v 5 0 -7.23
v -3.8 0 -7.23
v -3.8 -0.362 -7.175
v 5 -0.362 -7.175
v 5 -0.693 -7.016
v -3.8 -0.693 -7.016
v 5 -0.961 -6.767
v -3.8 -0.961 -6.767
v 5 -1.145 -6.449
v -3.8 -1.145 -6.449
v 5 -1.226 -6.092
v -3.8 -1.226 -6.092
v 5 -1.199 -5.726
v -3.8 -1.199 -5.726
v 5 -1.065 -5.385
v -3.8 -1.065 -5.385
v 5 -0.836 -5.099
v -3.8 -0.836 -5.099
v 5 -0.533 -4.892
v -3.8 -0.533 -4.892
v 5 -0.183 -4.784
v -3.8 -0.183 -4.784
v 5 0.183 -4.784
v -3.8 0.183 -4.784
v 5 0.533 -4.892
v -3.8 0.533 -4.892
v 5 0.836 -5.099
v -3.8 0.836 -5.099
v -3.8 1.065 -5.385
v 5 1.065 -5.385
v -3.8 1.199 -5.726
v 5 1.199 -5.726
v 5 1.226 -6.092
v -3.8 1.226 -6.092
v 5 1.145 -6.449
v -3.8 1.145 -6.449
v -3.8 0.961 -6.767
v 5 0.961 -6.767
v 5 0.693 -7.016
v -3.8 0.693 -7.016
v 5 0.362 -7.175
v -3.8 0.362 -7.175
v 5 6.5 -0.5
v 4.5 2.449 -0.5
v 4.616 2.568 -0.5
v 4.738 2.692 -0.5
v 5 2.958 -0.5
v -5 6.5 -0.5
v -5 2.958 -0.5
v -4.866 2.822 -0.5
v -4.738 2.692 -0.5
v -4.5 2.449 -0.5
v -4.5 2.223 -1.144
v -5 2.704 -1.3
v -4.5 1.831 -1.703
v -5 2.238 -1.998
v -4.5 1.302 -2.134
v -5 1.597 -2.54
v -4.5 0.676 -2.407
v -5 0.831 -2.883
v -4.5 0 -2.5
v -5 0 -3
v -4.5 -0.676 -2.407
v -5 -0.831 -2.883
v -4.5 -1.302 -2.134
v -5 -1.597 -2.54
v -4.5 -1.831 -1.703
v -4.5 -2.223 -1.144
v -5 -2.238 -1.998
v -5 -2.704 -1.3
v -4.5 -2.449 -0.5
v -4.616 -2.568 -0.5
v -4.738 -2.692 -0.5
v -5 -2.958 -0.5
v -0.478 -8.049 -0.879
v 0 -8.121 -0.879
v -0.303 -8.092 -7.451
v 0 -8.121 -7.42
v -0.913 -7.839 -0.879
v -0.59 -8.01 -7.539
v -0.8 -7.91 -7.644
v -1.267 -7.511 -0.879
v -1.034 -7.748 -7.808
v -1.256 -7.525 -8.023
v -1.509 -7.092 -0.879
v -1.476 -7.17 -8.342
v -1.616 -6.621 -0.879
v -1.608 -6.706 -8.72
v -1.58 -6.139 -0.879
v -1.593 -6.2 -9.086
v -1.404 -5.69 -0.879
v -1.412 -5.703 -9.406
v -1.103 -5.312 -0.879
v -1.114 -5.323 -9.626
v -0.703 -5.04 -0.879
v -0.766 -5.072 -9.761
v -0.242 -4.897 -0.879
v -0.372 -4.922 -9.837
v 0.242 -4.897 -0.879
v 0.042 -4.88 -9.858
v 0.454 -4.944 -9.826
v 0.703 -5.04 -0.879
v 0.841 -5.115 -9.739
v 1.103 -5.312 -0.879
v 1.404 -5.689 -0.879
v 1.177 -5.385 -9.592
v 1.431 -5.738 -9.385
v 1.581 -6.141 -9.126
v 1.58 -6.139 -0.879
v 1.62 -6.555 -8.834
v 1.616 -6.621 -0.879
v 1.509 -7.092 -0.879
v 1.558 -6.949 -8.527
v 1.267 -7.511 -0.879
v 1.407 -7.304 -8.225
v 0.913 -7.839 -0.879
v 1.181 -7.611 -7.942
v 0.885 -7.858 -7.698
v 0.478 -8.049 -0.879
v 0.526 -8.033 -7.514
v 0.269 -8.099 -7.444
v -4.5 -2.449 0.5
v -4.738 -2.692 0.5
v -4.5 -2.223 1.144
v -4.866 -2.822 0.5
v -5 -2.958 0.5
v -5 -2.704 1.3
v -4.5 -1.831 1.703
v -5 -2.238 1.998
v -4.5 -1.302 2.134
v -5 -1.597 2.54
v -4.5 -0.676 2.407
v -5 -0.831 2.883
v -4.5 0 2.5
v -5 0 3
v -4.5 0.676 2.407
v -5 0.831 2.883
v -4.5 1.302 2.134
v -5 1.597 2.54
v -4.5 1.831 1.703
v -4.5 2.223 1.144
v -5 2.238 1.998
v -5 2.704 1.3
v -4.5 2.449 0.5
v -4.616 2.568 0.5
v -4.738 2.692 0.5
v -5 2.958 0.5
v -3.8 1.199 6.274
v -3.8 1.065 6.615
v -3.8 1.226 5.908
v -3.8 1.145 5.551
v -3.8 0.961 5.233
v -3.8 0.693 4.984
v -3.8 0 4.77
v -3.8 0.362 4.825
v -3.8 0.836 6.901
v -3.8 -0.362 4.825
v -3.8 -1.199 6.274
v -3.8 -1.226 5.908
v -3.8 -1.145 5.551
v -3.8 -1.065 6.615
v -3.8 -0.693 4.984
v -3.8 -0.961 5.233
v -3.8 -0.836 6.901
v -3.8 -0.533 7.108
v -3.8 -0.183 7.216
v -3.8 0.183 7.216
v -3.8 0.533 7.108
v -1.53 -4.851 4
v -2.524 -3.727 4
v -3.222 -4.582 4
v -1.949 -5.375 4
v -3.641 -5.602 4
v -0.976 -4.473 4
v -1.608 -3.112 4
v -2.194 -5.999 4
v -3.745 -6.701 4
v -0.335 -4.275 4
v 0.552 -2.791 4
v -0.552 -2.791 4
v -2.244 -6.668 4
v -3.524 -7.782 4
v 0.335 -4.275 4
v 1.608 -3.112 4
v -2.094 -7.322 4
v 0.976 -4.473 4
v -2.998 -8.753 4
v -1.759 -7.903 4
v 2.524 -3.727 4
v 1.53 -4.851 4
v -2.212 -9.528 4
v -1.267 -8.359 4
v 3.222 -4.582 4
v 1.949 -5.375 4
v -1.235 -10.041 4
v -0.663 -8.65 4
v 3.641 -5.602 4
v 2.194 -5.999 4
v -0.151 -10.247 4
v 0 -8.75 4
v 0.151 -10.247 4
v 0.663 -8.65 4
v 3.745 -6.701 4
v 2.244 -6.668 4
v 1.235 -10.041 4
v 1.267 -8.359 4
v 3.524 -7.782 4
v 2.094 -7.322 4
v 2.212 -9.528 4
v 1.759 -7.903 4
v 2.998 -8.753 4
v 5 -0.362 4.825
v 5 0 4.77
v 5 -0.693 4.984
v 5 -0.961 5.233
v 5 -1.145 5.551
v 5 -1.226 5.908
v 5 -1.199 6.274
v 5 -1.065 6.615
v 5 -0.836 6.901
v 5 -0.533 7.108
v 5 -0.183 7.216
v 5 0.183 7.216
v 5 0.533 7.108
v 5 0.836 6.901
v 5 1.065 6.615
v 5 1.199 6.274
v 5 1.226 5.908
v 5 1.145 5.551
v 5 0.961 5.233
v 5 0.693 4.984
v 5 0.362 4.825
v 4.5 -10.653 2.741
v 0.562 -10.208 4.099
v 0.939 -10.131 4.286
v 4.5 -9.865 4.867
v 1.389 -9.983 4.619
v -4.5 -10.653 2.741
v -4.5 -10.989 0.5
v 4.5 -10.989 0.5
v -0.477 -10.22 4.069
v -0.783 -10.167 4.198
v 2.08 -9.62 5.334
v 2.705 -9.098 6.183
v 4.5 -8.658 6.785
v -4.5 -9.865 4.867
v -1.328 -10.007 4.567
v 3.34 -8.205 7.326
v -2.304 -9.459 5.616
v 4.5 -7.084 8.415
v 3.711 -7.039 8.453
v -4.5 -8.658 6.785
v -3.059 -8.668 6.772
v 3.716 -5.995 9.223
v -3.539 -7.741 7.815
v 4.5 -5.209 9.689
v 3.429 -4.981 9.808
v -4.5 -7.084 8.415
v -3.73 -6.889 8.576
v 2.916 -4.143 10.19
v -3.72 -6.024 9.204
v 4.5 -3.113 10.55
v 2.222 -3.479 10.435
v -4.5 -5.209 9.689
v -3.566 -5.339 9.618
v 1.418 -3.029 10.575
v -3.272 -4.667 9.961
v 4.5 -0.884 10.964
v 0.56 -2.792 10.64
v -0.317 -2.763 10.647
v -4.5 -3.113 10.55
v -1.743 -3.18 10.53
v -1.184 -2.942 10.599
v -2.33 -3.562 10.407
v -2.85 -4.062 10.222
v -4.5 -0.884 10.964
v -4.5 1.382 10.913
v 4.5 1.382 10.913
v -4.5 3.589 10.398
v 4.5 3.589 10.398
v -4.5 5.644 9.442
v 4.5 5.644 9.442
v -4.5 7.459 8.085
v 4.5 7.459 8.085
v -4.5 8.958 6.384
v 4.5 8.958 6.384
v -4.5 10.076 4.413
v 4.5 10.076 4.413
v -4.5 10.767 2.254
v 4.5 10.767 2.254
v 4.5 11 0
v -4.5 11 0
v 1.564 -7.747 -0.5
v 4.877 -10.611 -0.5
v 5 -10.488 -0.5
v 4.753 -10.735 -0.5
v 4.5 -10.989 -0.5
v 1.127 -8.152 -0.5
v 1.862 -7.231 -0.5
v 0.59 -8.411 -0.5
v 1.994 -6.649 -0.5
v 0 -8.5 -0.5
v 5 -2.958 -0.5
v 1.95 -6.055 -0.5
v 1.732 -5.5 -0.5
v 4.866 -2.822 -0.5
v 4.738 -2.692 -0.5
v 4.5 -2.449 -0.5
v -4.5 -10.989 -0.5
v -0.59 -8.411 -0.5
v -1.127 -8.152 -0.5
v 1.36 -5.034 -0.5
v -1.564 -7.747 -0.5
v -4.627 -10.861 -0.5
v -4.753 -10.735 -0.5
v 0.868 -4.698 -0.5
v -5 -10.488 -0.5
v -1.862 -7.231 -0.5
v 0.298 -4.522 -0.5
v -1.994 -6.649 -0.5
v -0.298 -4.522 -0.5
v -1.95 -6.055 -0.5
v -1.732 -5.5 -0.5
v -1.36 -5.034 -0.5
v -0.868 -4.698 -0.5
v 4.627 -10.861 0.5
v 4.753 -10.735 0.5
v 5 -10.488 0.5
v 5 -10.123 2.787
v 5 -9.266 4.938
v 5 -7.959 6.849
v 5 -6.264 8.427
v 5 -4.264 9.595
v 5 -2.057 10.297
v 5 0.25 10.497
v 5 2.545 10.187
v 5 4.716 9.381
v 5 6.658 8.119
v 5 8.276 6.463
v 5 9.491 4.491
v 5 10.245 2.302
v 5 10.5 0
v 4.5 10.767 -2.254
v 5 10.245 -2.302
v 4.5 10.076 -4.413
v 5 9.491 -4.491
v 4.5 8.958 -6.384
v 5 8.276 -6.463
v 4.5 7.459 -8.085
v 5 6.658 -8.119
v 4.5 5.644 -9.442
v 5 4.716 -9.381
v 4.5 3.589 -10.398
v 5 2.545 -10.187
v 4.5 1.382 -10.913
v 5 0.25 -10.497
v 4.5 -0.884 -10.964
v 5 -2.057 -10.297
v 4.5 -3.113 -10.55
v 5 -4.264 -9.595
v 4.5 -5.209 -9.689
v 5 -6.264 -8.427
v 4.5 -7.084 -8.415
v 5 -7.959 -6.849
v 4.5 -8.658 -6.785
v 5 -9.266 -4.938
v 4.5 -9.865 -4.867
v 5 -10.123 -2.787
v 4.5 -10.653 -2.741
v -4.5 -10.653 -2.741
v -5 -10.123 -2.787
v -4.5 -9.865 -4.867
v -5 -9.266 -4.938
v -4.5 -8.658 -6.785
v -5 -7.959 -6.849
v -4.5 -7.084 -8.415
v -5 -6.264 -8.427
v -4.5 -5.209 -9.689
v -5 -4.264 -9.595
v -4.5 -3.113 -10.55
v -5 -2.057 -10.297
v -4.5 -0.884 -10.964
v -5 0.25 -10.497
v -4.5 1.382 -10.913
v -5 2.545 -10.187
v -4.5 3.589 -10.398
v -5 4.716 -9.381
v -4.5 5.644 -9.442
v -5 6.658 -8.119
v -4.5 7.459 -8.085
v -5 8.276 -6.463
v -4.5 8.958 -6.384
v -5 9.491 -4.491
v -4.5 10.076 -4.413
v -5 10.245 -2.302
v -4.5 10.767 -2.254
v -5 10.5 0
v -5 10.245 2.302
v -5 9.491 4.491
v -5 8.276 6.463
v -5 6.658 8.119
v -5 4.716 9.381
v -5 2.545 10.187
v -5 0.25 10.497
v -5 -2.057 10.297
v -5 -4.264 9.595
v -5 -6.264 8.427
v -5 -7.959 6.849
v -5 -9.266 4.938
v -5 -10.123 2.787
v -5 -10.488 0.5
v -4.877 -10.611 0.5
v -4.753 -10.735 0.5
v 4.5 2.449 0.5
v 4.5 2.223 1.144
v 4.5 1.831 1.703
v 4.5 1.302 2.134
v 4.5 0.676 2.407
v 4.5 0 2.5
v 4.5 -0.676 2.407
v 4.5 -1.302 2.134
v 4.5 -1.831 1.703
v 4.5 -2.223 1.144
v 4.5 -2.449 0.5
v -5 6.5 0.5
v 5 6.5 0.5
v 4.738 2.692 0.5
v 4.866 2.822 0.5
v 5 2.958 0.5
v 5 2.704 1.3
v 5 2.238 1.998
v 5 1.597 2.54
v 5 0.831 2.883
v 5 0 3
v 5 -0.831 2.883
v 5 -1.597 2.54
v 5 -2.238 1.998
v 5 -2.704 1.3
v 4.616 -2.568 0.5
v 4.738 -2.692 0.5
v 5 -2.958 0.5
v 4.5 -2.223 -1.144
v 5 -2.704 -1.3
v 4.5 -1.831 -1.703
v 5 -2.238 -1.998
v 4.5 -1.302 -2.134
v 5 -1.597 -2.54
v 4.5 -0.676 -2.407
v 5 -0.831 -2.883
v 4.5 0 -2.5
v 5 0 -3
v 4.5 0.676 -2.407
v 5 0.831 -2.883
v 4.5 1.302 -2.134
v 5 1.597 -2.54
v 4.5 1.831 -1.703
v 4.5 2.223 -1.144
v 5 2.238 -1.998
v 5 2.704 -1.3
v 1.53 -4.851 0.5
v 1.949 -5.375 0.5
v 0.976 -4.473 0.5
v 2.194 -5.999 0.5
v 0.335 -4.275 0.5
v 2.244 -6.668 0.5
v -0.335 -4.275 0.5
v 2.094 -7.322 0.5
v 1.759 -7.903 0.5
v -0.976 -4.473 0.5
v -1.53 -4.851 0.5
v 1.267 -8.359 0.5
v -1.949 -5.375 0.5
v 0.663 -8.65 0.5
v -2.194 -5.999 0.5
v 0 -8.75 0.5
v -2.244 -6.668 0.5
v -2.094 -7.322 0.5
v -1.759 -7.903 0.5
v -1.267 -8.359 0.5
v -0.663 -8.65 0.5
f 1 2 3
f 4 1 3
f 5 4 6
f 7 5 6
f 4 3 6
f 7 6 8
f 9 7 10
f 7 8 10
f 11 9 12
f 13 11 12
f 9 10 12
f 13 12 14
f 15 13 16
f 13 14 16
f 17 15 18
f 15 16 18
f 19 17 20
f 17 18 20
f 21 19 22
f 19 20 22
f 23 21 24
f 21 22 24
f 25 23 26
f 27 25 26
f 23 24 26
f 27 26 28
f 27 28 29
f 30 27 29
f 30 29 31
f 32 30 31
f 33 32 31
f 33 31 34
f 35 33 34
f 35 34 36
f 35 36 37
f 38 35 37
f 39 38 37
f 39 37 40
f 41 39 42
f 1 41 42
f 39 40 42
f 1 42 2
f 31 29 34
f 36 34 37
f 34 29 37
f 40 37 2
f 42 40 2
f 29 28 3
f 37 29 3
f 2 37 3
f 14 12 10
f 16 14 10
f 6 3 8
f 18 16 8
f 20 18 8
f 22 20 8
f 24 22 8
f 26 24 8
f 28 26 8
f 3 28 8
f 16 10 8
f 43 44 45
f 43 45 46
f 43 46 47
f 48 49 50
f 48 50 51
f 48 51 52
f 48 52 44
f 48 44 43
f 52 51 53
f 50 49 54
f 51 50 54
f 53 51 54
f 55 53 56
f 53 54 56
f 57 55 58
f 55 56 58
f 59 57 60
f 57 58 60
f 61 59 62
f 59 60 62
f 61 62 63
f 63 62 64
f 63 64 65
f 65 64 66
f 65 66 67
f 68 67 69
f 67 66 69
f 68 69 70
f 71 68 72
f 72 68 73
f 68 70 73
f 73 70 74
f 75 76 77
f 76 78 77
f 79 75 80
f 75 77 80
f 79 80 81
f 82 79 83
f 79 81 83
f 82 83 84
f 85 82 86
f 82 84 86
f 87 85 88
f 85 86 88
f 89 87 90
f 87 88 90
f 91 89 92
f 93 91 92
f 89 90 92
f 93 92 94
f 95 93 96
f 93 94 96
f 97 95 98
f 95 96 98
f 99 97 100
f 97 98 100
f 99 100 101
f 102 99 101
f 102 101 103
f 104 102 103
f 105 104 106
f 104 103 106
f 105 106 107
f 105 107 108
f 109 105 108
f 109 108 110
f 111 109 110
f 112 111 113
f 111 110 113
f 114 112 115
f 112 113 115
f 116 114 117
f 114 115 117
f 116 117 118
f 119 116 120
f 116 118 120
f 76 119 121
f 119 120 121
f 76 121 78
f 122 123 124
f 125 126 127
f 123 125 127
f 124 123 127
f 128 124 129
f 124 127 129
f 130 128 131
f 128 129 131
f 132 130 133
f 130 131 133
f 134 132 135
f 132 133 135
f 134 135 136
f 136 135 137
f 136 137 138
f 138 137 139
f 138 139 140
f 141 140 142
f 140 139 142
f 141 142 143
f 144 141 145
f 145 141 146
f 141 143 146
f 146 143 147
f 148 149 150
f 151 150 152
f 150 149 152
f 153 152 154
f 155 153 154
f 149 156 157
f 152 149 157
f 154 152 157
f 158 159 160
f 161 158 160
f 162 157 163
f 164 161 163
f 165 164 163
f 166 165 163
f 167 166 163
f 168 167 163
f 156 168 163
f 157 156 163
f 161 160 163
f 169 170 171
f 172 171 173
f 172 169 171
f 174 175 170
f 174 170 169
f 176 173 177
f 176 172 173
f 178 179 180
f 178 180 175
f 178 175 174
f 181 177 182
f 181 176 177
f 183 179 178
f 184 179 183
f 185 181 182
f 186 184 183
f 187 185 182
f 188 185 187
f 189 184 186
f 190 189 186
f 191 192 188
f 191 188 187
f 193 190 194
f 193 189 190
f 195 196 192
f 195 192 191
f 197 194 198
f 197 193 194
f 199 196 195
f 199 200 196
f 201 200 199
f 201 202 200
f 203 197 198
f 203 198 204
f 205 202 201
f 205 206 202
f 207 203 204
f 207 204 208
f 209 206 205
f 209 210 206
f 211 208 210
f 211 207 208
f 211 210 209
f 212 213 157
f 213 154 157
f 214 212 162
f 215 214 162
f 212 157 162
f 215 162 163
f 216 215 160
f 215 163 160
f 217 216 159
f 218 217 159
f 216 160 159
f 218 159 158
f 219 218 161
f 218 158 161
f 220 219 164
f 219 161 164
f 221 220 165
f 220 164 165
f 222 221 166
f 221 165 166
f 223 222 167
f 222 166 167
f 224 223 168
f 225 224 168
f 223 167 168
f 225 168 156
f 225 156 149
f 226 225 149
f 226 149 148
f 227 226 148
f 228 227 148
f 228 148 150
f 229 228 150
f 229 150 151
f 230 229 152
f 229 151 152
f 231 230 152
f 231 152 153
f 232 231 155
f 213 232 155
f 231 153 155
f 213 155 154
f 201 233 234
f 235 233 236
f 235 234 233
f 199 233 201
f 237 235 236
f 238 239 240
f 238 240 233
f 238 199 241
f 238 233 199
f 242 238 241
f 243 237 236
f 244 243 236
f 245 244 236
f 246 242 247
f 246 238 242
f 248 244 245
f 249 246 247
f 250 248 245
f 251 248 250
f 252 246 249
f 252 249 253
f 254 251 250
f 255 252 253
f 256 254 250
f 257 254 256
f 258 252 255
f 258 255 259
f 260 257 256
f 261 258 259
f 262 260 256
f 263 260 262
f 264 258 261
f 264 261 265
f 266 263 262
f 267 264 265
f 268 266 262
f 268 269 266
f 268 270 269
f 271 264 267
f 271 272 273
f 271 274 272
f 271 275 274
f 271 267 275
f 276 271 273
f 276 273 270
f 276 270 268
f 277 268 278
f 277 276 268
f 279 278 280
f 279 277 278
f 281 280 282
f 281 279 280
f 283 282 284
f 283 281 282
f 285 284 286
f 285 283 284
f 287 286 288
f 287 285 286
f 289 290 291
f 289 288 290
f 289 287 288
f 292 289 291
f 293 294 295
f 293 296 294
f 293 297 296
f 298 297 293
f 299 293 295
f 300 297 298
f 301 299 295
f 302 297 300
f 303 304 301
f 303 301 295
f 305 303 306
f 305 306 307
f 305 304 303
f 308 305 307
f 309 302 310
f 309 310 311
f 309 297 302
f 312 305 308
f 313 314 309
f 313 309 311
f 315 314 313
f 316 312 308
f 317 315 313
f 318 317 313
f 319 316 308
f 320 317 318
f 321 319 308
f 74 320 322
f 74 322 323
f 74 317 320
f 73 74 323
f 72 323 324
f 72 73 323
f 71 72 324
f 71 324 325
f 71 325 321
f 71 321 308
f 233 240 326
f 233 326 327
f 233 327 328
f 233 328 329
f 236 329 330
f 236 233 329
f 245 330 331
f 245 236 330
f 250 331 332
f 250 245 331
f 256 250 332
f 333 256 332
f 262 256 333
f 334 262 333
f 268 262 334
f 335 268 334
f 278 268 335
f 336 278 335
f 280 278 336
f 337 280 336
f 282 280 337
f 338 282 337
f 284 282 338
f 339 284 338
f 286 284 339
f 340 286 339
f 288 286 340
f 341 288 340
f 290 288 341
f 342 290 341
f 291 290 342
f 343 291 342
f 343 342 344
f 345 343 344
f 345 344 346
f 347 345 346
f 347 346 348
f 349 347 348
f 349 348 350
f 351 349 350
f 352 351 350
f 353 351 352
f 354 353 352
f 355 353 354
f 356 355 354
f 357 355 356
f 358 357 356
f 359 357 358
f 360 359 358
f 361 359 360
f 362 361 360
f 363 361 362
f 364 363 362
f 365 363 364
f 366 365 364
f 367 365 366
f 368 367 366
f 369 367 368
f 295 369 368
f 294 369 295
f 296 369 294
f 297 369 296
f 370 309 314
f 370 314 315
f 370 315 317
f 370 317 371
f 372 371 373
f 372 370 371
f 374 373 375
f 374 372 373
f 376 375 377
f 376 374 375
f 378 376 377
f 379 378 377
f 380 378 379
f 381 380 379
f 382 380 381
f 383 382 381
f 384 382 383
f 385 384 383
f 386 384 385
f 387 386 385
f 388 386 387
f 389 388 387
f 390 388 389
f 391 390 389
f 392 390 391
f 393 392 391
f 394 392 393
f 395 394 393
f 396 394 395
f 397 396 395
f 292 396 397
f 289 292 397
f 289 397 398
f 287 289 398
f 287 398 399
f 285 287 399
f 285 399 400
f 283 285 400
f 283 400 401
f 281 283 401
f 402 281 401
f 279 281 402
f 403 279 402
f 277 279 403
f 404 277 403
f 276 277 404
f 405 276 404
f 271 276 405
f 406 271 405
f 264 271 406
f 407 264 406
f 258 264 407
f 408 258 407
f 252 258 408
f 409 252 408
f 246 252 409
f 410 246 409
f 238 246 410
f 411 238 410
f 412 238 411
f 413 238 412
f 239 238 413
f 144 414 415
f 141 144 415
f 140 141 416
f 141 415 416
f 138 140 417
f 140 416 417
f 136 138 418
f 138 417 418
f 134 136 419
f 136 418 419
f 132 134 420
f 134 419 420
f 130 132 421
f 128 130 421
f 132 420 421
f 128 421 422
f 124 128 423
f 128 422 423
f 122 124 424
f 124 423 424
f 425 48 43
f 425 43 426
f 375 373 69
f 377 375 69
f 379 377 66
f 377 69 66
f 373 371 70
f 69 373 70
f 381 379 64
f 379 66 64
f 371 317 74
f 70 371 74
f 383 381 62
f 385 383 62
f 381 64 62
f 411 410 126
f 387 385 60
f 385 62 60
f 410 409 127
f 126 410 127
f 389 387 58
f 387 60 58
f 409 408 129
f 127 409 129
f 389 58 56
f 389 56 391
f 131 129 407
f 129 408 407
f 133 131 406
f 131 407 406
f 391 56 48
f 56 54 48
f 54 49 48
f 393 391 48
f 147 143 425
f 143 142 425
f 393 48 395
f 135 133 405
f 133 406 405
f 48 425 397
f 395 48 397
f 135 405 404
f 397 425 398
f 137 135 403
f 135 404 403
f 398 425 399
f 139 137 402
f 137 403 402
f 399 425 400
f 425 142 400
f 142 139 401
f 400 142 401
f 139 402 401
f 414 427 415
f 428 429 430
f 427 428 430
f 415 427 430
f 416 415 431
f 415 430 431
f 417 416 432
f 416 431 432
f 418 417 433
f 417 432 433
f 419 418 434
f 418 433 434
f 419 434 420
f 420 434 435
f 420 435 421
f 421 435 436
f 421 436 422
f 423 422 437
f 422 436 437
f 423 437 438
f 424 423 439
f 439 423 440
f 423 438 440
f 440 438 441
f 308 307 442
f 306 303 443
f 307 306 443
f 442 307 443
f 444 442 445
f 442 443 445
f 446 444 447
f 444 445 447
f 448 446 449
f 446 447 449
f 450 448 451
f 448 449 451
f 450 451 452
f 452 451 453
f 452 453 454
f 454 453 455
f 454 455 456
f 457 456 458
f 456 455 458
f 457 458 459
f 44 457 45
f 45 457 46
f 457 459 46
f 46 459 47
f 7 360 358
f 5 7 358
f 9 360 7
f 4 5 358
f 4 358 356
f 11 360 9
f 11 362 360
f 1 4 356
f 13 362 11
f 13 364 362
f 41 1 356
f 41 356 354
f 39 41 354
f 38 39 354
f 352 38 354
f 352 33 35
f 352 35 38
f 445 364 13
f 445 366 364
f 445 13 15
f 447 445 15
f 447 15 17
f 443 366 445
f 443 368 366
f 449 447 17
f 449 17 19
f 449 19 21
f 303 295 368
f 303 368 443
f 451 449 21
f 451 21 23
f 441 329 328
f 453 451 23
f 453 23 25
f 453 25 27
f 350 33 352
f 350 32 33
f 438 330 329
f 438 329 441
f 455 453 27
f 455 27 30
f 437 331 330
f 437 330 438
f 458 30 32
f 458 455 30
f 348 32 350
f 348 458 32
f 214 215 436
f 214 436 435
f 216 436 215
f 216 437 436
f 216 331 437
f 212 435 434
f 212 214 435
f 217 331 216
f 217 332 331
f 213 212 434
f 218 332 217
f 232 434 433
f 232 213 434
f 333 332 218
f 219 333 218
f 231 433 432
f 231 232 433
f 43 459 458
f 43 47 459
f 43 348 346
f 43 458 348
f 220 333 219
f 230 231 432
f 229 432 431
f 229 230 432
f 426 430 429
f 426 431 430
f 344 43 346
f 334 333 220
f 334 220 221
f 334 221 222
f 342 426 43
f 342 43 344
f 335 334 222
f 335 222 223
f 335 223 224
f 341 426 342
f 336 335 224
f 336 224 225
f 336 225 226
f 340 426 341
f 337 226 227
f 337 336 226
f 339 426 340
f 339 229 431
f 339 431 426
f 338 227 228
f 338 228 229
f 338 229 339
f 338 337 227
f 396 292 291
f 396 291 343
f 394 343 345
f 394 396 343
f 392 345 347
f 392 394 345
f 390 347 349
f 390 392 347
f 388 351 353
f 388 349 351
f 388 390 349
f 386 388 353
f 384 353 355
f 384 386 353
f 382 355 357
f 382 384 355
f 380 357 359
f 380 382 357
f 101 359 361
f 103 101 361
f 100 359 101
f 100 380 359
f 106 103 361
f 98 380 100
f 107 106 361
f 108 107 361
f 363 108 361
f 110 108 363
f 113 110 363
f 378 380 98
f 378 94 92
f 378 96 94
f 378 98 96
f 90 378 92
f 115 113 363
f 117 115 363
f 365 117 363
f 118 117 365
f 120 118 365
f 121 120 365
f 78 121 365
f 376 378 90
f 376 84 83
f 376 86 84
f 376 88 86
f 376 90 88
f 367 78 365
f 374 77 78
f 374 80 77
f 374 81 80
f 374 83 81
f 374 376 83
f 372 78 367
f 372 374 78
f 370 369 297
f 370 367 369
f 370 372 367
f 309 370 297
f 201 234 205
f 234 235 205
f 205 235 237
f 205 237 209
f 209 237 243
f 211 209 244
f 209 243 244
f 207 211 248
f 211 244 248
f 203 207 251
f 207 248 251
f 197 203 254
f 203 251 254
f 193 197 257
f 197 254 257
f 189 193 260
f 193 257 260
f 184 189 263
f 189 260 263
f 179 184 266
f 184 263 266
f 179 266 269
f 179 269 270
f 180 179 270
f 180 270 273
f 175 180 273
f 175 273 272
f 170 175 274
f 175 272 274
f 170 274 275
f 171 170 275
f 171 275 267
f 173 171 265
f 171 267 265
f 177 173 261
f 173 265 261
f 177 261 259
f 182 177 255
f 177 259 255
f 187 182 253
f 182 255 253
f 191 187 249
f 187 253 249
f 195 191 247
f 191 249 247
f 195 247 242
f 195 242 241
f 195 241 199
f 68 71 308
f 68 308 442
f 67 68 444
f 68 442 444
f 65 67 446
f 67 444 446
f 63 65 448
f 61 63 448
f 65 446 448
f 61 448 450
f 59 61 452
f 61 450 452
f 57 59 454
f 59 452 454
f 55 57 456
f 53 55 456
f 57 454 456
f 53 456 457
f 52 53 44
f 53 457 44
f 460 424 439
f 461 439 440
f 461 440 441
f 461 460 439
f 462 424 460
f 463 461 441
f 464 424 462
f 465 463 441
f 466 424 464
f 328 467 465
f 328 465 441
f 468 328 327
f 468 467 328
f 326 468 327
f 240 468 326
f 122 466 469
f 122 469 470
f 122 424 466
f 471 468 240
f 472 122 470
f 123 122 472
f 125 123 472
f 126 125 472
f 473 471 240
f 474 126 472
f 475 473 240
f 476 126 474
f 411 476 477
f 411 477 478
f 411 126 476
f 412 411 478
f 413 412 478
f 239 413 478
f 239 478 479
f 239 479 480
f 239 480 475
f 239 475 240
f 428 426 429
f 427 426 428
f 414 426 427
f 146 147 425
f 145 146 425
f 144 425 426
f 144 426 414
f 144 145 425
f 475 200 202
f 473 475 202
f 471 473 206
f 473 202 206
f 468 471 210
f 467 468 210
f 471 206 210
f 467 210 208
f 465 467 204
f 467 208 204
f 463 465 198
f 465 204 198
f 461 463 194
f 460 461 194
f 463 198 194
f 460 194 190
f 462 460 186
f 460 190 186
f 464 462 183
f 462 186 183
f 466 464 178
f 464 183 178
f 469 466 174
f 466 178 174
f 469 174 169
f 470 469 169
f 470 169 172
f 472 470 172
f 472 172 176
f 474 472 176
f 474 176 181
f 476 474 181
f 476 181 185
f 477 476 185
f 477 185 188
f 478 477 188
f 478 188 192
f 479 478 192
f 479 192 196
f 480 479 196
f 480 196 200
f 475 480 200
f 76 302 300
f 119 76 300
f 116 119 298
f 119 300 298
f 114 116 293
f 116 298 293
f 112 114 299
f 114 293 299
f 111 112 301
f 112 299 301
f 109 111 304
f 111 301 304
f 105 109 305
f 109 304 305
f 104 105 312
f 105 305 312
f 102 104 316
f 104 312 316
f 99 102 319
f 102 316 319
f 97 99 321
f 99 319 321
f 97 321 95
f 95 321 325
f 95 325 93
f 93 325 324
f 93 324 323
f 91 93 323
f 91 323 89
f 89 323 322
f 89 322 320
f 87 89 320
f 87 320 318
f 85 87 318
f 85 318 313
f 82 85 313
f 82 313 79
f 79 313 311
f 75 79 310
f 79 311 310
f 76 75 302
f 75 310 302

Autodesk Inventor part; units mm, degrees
sketch "Sketch_1" plane through (0, 0, 0) normal (0, 0, 1) x (1, 0, 0)
  line L0 (5, 0) -> (-5, 0)
  line L1 (-5, 10.5) -> (-5, 3)
  line L2 (-5, 3) -> (-4.5, 2.5)
  line L3 (-4.5, 2.5) -> (4.5, 2.5)
  line L4 (4.5, 2.5) -> (5, 3)
  line L5 (5, 3) -> (5, 10.5)
  line L6 (5, 10.5) -> (4.5, 11)
  line L7 (4.5, 11) -> (-4.5, 11)
  line L8 (-4.5, 11) -> (-5, 10.5)
revolve "Revolution1" add sketch "Sketch_1" angle 360 about axis through (5, 0, 0) along (1, 0, 0)
sketch "Sketch_2" plane through (0, 0, 0) normal (1, 0, 0) x (0, 1, 0)
  line L0 (-11, 0.5) -> (-11, -0.5)
  line L1 (-11, -0.5) -> (6.5, -0.5)
  line L2 (6.5, -0.5) -> (6.5, 0.5)
  line L3 (6.5, 0.5) -> (-11, 0.5)
extrude "Extrusion1" cut sketch "Sketch_2" along normal mid plane 10
sketch "Sketch_3" plane through (0, 0, 0) normal (1, 0, 0) x (0, 1, 0)
  line L0 (-6.5, 11) -> (-6.5, 0)
  line L1 (-6.5, 0) -> (-8.75, 0)
  line L2 (-8.75, 0) -> (-8.75, 4)
  line L3 (-8.75, 4) -> (-10.25, 4)
  line L4 (-10.25, 4) -> (-10.25, 11)
  line L5 (-10.25, 11) -> (-6.5, 11)
  line L6 (-6.5, 11) -> (-6.5, 0)
revolve "Revolution2" cut sketch "Sketch_3" angle 360 about axis through (0, -6.5, 11) along (0, 0, 1)
sketch "Sketch4" plane through (-4.5, -2.4495, -0.5) normal (0, 0, 1) x (1, 0, 0)
  point P0 (4.5, -4.0505)
hole "Hole1" at (0, -6.5, -0.5) direction (0, 0, -1) diameter 3.242 depth 9.75 countersink diameter 4 countersink angle 90 thread size "M4x0.7" class "6H" standard "ISO Metric profile"
ref_plane "body_screw_XY" through (0, -6.5, 4) normal (0, 0, 1) x (1, 0, 0)
ref_plane "body_screw_YZ" through (0, -6.5, 4) normal (1, 0, 0) x (0, 1, 0)
ref_plane "body_screw_ZX" through (0, -6.5, 4) normal (0, 1, 0) x (0, 0, 1)
sketch "スケッチ5" plane through (5, 0, 0) normal (1, 0, 0) x (0, 0, -1)
  line L0 (0, 0) -> (-6, 0)
  point P0 (6, 0)
  dimension "d12" = 6
  dimension "d15" = 360
hole "穴2" at (5, 0, 6) at (5, 0, -6) direction (-1, 0, 0) diameter 2.459 depth 8.8 thread size "M3x0.5" class "6H" standard "ISO Metric profile"
properties part number "SCS5-10b" material "鋼、炭素鋼"
